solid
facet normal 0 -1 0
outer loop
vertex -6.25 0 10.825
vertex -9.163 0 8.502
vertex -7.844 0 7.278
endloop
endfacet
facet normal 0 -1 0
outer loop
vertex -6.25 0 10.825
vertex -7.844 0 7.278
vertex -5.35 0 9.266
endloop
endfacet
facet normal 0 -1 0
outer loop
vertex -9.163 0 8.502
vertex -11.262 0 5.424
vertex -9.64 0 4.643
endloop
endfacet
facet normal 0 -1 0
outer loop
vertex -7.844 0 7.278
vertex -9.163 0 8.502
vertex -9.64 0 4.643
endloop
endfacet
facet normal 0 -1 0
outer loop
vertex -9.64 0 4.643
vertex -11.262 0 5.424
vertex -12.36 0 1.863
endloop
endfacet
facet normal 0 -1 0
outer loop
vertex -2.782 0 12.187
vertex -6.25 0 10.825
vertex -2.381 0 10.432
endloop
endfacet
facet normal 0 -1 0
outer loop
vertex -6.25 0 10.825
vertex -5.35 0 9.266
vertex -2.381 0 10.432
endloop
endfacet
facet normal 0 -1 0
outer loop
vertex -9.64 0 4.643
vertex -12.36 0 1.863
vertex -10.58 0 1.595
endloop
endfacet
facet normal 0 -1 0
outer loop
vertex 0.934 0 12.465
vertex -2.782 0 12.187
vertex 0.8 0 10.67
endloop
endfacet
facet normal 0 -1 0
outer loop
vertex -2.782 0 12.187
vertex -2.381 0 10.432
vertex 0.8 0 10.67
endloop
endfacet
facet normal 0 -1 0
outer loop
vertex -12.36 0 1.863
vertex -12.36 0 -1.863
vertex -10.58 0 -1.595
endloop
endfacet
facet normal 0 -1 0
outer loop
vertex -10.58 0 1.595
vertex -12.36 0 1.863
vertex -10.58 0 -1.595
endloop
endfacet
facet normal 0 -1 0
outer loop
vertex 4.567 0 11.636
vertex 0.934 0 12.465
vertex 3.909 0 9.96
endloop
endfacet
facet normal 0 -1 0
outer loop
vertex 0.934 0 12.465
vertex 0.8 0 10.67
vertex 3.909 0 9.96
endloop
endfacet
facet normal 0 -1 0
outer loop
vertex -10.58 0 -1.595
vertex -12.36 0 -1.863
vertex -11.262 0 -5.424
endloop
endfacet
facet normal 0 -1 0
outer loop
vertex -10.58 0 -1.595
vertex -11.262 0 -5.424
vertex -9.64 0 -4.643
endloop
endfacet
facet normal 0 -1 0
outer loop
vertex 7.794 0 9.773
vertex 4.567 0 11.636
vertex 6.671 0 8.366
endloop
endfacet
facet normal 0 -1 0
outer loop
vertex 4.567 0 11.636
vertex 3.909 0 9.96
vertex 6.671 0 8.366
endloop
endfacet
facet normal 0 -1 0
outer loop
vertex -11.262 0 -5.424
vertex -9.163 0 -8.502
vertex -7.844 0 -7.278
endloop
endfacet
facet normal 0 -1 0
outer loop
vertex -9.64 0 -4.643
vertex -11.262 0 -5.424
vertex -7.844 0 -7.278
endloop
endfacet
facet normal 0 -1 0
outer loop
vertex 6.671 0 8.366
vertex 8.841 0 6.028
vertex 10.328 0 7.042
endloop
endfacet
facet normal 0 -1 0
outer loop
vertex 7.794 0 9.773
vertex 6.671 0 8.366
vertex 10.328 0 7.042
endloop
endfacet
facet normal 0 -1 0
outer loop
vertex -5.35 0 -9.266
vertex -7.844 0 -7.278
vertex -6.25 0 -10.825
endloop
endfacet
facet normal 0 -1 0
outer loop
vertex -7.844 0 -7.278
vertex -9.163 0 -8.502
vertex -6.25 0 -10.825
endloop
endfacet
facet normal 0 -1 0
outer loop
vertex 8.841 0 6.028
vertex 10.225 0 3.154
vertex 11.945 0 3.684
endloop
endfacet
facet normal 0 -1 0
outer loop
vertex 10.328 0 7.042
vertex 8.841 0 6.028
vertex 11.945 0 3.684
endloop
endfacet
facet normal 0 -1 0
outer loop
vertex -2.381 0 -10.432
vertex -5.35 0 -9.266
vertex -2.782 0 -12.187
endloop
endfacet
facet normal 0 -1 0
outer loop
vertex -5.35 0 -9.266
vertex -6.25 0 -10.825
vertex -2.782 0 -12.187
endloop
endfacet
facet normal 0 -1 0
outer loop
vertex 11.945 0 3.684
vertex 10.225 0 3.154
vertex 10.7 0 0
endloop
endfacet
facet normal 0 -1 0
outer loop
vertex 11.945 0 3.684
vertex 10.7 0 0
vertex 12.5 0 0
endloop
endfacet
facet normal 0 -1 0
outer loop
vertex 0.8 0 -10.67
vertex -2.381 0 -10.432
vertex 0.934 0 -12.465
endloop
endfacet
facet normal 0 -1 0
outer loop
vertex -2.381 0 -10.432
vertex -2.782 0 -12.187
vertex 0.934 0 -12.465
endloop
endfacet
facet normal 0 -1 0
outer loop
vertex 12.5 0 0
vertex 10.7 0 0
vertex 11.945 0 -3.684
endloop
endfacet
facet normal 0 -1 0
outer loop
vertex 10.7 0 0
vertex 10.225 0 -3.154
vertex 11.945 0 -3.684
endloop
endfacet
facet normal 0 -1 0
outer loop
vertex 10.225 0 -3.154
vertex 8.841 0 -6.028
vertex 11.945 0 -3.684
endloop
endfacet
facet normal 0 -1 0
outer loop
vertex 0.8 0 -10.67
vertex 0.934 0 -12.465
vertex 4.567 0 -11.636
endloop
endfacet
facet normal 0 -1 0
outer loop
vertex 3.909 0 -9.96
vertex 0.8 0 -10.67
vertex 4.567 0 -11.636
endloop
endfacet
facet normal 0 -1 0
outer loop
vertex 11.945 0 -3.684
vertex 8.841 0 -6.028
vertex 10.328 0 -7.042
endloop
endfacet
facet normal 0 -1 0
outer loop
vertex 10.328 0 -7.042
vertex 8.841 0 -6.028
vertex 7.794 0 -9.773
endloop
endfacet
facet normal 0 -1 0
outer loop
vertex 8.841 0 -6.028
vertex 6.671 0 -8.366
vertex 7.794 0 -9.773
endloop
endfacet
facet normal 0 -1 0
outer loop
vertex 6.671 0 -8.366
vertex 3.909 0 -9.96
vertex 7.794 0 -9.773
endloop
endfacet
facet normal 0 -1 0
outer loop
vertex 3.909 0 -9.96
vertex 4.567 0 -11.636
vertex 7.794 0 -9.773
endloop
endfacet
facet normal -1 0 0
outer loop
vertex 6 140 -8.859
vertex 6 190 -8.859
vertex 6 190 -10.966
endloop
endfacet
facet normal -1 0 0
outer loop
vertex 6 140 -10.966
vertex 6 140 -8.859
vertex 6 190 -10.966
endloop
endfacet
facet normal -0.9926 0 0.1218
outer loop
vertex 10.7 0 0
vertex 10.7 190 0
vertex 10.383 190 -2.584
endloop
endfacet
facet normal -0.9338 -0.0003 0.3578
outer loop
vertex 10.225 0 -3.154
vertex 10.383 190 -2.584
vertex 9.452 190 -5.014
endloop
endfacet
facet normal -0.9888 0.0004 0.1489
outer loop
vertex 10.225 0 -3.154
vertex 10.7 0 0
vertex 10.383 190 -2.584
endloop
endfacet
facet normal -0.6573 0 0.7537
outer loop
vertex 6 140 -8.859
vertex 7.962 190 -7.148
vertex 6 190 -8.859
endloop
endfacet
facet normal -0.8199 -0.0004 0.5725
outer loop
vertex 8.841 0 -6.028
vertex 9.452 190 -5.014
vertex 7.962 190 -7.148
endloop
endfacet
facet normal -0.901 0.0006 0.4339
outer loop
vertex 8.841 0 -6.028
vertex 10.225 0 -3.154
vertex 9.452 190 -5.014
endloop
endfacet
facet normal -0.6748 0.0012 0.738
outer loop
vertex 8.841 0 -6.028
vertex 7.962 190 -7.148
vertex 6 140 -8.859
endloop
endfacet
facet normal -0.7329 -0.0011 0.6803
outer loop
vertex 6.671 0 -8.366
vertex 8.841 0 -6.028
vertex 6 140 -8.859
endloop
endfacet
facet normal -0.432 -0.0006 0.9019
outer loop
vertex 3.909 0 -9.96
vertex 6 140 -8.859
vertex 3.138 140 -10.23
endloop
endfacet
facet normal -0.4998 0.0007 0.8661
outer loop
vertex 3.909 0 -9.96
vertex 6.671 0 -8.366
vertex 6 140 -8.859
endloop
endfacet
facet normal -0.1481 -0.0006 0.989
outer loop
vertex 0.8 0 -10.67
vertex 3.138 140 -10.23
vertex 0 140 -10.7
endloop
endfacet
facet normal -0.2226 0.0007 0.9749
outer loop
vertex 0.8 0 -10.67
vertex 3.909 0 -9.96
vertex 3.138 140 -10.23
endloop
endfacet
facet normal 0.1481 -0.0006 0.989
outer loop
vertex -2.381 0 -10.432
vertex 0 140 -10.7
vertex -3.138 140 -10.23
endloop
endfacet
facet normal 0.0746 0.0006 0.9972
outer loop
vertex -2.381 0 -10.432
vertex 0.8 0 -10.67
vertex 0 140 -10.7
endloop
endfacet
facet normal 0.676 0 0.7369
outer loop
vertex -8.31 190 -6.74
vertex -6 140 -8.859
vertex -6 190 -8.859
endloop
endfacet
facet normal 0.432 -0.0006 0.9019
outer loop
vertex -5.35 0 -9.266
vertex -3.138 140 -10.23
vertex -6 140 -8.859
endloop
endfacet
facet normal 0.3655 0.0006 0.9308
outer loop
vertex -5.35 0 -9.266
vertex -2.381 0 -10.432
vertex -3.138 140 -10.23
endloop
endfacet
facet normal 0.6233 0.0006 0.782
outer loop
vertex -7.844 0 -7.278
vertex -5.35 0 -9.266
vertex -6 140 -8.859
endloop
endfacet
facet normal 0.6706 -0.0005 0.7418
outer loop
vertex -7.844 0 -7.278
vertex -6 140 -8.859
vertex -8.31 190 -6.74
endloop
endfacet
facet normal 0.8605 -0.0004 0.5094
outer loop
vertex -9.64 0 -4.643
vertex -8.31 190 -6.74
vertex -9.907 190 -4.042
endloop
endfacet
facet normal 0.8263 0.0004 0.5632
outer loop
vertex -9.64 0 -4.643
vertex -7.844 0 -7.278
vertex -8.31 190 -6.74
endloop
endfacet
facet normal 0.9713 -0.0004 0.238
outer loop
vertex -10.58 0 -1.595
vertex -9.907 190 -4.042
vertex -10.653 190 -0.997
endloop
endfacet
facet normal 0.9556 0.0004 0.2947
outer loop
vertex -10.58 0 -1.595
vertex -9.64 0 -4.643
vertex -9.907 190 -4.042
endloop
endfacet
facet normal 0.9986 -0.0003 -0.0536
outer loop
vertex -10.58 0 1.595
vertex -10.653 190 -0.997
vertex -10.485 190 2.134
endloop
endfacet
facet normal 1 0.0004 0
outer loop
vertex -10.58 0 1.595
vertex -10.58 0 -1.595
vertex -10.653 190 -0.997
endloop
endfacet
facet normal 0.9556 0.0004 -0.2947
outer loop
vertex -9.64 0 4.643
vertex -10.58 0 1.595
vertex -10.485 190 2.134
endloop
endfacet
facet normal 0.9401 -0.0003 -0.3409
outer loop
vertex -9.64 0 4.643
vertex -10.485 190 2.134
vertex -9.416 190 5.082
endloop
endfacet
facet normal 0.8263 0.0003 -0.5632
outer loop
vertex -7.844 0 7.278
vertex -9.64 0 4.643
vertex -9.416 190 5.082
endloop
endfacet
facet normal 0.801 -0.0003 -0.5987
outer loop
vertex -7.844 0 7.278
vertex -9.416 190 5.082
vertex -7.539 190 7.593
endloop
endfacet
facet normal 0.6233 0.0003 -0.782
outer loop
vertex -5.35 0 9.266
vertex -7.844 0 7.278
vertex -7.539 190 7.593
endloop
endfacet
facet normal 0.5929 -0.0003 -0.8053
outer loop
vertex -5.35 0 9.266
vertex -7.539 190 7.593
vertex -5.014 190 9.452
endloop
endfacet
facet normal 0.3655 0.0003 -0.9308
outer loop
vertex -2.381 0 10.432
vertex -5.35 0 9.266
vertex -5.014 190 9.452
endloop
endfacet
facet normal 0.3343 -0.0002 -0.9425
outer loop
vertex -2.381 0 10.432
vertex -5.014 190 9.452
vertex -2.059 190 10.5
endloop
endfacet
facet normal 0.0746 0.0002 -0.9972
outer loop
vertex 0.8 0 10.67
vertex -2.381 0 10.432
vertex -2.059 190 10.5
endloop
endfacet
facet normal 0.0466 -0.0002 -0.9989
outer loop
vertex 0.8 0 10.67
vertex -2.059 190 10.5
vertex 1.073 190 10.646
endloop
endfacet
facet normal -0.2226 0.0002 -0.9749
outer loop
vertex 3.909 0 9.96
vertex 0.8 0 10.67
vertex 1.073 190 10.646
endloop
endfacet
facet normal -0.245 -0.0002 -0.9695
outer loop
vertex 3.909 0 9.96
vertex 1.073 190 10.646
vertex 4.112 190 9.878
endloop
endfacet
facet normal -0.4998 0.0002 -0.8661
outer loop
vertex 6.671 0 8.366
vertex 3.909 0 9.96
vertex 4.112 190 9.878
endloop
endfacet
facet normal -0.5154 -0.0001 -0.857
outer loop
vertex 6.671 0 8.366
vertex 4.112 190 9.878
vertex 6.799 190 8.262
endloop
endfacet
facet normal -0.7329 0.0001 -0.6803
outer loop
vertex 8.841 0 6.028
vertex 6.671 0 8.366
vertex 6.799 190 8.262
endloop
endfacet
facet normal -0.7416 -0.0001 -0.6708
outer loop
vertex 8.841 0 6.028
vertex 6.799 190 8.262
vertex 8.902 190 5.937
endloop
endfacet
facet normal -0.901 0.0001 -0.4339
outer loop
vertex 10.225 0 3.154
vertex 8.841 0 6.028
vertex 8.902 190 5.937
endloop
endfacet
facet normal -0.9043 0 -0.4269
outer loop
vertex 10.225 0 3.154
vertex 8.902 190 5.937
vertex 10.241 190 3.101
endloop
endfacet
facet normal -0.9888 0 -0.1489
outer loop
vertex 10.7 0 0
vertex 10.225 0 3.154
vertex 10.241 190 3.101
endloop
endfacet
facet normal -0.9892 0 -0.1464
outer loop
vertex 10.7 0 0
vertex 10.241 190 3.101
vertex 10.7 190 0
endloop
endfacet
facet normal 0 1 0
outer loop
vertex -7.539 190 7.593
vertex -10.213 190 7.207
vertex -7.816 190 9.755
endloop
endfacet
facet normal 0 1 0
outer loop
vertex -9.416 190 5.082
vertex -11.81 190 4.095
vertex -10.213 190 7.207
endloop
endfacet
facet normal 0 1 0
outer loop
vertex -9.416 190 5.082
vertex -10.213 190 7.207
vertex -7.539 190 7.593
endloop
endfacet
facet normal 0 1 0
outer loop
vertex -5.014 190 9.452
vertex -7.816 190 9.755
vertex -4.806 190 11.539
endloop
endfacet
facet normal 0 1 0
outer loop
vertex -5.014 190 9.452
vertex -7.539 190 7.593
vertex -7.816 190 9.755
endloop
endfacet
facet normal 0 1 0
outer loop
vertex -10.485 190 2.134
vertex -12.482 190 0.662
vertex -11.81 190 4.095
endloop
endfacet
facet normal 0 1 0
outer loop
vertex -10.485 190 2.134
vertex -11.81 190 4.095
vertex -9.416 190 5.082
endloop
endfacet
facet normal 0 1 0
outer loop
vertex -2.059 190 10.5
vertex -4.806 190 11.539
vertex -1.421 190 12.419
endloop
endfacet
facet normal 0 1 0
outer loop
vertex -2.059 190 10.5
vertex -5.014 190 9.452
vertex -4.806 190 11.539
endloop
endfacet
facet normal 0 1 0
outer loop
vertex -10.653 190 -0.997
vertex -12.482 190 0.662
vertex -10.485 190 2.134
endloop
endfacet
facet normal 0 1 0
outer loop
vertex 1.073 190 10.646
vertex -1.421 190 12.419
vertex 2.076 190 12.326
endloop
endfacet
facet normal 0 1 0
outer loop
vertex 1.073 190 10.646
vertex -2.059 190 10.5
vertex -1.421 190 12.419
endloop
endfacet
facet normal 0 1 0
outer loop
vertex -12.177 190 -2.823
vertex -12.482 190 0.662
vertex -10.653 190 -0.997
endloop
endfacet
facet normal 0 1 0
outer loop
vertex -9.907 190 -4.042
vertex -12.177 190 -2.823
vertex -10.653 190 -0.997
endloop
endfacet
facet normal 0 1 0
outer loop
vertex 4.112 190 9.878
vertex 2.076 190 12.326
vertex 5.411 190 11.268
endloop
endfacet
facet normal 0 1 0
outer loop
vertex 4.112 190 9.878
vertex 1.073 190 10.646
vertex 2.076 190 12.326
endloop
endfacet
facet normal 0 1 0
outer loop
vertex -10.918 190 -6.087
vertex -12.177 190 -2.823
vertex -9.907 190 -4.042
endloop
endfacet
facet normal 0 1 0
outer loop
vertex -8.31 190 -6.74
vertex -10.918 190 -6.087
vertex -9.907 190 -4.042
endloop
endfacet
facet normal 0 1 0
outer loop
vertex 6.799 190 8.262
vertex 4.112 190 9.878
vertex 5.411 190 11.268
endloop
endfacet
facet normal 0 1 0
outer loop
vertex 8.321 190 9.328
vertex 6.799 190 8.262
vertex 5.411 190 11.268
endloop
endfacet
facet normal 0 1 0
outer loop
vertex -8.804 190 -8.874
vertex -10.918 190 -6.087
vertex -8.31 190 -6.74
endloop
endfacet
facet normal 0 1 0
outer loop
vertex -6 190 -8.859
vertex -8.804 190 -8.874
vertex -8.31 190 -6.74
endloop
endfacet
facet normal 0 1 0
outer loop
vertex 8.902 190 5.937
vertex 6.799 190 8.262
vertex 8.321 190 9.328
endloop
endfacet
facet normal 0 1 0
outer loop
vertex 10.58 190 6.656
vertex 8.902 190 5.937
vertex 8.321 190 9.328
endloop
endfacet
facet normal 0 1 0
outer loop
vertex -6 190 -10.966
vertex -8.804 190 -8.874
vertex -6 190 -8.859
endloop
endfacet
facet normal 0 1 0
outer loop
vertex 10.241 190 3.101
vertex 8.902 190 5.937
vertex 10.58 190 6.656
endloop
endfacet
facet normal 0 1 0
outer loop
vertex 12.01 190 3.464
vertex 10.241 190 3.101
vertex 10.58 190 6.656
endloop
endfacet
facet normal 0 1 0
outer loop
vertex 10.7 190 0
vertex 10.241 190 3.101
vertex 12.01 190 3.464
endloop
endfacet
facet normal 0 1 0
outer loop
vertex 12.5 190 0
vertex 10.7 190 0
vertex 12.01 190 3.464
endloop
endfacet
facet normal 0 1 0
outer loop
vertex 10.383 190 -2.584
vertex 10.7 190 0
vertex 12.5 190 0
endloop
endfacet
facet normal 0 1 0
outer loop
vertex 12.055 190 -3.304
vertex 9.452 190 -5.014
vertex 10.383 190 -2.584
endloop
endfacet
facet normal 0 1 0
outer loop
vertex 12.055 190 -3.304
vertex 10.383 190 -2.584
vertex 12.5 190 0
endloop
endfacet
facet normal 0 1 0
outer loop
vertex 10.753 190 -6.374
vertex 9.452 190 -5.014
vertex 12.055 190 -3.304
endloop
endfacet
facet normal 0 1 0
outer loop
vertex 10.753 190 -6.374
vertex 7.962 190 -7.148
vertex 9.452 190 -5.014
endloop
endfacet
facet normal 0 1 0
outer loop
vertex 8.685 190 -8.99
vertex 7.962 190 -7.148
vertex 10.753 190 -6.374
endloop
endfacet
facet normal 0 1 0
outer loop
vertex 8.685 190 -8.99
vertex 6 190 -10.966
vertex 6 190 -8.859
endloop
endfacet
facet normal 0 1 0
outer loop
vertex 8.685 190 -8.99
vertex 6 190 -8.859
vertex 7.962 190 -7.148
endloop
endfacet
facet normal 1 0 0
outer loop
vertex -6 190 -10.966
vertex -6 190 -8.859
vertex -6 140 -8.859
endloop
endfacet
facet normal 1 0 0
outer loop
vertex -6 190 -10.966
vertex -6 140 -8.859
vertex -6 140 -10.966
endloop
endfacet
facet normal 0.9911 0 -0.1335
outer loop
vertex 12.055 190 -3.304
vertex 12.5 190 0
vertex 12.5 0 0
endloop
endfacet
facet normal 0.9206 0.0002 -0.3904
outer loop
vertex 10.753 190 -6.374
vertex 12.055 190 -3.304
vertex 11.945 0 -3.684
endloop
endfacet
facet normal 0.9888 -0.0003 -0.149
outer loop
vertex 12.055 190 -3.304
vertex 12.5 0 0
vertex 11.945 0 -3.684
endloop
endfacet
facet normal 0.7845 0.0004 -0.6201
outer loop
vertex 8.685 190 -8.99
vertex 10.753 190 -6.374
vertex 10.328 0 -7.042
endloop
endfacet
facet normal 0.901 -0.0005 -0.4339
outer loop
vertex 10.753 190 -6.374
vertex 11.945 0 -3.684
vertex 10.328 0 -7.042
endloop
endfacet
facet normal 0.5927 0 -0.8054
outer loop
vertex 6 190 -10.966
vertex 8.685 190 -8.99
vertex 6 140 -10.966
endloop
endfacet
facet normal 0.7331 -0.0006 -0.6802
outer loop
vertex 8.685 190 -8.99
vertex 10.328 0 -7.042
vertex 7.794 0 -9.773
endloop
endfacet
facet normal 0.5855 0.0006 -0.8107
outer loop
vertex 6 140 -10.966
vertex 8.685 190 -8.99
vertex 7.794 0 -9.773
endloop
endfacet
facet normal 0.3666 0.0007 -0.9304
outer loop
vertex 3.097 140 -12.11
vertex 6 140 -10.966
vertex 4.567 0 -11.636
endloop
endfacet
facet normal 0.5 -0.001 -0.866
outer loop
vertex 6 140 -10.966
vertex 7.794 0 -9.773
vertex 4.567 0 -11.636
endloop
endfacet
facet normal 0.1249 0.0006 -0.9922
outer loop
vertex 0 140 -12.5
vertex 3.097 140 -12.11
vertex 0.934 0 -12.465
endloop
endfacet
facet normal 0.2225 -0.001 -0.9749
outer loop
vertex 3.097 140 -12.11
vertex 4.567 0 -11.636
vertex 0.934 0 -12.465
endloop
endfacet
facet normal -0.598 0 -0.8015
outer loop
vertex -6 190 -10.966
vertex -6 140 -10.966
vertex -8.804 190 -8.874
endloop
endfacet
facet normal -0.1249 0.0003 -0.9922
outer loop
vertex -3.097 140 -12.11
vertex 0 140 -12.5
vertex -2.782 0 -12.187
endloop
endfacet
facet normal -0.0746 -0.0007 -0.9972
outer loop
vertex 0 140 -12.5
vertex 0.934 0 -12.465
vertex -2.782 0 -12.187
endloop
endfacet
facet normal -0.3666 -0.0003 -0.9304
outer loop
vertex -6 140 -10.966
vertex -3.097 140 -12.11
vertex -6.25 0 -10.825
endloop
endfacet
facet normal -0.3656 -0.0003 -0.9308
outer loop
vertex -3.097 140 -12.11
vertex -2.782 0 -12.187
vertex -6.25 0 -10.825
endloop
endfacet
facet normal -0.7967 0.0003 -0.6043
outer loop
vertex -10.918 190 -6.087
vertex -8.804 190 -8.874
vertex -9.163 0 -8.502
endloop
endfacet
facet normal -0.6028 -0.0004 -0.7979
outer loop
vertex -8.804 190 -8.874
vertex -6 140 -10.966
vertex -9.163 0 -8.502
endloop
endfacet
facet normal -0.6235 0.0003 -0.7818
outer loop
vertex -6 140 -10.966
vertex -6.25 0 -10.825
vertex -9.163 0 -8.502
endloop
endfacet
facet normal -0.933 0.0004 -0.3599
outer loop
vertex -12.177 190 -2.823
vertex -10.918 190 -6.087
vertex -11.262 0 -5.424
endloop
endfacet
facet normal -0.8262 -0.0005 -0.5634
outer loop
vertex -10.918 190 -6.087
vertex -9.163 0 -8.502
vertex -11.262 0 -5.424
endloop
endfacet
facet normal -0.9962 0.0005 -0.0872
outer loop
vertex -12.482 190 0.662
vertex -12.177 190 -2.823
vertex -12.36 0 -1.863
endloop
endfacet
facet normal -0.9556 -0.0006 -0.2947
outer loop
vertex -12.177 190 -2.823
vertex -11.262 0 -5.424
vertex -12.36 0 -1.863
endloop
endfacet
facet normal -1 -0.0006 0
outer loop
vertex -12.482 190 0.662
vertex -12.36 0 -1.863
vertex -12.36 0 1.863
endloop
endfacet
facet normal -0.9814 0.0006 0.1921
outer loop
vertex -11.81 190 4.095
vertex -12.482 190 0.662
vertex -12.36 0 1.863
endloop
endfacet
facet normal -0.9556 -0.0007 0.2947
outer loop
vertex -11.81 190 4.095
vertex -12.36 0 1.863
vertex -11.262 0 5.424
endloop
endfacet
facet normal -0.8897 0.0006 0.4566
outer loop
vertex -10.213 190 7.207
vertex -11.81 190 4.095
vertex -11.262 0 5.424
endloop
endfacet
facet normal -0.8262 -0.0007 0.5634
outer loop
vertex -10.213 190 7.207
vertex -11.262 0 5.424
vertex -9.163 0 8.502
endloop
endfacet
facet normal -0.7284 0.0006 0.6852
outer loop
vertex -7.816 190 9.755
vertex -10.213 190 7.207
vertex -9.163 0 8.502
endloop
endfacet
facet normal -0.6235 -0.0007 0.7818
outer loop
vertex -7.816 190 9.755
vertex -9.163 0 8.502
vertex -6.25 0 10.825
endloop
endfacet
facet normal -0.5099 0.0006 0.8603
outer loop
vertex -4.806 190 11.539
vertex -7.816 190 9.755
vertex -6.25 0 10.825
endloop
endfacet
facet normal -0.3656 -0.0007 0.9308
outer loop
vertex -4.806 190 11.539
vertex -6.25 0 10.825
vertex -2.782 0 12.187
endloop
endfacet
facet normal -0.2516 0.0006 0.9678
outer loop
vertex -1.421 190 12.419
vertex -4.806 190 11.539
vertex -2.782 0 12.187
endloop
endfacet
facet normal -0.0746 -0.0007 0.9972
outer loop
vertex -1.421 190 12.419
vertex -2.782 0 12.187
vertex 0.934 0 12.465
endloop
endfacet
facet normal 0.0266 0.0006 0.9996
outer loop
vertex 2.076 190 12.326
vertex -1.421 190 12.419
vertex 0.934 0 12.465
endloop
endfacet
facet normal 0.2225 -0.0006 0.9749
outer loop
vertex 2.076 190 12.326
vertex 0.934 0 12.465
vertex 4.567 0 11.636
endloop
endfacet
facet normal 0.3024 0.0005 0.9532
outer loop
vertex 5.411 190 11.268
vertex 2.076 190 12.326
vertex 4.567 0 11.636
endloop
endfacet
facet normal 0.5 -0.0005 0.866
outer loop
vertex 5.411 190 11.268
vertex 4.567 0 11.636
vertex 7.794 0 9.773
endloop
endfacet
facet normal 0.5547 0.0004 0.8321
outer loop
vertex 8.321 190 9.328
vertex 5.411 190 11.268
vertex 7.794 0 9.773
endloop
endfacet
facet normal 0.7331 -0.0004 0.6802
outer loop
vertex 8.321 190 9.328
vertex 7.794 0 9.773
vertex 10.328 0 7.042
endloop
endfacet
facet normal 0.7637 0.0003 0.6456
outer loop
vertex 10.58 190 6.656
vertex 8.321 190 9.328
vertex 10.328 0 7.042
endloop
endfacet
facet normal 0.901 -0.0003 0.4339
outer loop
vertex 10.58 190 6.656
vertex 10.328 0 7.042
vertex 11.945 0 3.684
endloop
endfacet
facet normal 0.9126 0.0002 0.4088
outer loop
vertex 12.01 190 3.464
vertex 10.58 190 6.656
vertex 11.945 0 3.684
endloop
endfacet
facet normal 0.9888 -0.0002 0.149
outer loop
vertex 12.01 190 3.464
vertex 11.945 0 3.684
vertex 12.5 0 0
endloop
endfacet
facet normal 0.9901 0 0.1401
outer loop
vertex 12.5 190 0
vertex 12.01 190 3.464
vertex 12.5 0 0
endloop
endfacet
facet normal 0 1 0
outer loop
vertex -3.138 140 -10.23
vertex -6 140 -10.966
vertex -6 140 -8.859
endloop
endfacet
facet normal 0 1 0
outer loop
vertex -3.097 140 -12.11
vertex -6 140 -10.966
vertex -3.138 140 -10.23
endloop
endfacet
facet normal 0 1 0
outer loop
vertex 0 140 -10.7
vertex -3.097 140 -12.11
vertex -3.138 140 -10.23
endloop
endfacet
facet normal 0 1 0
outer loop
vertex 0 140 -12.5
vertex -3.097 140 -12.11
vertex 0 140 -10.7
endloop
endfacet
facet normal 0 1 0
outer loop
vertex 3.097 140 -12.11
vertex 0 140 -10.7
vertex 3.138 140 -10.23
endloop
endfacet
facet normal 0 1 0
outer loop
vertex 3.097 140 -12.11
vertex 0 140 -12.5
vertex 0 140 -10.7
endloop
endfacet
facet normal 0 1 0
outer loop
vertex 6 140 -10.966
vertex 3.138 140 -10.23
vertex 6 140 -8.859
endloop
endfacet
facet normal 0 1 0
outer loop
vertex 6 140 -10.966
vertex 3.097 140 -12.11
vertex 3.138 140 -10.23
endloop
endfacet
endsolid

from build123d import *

# Parameters (mm, degrees)
SKETCH_1_R          = 12.5
SKETCH_1_R_2        = 10.7
EXTRUDE_1_DEPTH     = 190
SKETCH_3_W          = 12
SKETCH_3_H          = 4.814393821
CUT_EXTRUDE_1_DEPTH = 50


with BuildPart() as part:
    # Эскиз1 → Бобышка-Вытянуть1 (new body)
    with BuildSketch(Plane(origin=(0, 0, 0), x_dir=(1, 0, 0), z_dir=(0, 1, 0))):
        Circle(SKETCH_1_R)
        Circle(SKETCH_1_R_2, mode=Mode.SUBTRACT)
    extrude(amount=EXTRUDE_1_DEPTH)

    # Эскиз3 → Вырез-Вытянуть1 (cut)
    with BuildSketch(Plane(origin=(0, 190, 0), x_dir=(1, 0, 0), z_dir=(0, 1, 0))):
        with Locations((0, 10.407196911)):
            Rectangle(SKETCH_3_W, SKETCH_3_H)
    extrude(amount=-CUT_EXTRUDE_1_DEPTH, mode=Mode.SUBTRACT)


solid = part.part
